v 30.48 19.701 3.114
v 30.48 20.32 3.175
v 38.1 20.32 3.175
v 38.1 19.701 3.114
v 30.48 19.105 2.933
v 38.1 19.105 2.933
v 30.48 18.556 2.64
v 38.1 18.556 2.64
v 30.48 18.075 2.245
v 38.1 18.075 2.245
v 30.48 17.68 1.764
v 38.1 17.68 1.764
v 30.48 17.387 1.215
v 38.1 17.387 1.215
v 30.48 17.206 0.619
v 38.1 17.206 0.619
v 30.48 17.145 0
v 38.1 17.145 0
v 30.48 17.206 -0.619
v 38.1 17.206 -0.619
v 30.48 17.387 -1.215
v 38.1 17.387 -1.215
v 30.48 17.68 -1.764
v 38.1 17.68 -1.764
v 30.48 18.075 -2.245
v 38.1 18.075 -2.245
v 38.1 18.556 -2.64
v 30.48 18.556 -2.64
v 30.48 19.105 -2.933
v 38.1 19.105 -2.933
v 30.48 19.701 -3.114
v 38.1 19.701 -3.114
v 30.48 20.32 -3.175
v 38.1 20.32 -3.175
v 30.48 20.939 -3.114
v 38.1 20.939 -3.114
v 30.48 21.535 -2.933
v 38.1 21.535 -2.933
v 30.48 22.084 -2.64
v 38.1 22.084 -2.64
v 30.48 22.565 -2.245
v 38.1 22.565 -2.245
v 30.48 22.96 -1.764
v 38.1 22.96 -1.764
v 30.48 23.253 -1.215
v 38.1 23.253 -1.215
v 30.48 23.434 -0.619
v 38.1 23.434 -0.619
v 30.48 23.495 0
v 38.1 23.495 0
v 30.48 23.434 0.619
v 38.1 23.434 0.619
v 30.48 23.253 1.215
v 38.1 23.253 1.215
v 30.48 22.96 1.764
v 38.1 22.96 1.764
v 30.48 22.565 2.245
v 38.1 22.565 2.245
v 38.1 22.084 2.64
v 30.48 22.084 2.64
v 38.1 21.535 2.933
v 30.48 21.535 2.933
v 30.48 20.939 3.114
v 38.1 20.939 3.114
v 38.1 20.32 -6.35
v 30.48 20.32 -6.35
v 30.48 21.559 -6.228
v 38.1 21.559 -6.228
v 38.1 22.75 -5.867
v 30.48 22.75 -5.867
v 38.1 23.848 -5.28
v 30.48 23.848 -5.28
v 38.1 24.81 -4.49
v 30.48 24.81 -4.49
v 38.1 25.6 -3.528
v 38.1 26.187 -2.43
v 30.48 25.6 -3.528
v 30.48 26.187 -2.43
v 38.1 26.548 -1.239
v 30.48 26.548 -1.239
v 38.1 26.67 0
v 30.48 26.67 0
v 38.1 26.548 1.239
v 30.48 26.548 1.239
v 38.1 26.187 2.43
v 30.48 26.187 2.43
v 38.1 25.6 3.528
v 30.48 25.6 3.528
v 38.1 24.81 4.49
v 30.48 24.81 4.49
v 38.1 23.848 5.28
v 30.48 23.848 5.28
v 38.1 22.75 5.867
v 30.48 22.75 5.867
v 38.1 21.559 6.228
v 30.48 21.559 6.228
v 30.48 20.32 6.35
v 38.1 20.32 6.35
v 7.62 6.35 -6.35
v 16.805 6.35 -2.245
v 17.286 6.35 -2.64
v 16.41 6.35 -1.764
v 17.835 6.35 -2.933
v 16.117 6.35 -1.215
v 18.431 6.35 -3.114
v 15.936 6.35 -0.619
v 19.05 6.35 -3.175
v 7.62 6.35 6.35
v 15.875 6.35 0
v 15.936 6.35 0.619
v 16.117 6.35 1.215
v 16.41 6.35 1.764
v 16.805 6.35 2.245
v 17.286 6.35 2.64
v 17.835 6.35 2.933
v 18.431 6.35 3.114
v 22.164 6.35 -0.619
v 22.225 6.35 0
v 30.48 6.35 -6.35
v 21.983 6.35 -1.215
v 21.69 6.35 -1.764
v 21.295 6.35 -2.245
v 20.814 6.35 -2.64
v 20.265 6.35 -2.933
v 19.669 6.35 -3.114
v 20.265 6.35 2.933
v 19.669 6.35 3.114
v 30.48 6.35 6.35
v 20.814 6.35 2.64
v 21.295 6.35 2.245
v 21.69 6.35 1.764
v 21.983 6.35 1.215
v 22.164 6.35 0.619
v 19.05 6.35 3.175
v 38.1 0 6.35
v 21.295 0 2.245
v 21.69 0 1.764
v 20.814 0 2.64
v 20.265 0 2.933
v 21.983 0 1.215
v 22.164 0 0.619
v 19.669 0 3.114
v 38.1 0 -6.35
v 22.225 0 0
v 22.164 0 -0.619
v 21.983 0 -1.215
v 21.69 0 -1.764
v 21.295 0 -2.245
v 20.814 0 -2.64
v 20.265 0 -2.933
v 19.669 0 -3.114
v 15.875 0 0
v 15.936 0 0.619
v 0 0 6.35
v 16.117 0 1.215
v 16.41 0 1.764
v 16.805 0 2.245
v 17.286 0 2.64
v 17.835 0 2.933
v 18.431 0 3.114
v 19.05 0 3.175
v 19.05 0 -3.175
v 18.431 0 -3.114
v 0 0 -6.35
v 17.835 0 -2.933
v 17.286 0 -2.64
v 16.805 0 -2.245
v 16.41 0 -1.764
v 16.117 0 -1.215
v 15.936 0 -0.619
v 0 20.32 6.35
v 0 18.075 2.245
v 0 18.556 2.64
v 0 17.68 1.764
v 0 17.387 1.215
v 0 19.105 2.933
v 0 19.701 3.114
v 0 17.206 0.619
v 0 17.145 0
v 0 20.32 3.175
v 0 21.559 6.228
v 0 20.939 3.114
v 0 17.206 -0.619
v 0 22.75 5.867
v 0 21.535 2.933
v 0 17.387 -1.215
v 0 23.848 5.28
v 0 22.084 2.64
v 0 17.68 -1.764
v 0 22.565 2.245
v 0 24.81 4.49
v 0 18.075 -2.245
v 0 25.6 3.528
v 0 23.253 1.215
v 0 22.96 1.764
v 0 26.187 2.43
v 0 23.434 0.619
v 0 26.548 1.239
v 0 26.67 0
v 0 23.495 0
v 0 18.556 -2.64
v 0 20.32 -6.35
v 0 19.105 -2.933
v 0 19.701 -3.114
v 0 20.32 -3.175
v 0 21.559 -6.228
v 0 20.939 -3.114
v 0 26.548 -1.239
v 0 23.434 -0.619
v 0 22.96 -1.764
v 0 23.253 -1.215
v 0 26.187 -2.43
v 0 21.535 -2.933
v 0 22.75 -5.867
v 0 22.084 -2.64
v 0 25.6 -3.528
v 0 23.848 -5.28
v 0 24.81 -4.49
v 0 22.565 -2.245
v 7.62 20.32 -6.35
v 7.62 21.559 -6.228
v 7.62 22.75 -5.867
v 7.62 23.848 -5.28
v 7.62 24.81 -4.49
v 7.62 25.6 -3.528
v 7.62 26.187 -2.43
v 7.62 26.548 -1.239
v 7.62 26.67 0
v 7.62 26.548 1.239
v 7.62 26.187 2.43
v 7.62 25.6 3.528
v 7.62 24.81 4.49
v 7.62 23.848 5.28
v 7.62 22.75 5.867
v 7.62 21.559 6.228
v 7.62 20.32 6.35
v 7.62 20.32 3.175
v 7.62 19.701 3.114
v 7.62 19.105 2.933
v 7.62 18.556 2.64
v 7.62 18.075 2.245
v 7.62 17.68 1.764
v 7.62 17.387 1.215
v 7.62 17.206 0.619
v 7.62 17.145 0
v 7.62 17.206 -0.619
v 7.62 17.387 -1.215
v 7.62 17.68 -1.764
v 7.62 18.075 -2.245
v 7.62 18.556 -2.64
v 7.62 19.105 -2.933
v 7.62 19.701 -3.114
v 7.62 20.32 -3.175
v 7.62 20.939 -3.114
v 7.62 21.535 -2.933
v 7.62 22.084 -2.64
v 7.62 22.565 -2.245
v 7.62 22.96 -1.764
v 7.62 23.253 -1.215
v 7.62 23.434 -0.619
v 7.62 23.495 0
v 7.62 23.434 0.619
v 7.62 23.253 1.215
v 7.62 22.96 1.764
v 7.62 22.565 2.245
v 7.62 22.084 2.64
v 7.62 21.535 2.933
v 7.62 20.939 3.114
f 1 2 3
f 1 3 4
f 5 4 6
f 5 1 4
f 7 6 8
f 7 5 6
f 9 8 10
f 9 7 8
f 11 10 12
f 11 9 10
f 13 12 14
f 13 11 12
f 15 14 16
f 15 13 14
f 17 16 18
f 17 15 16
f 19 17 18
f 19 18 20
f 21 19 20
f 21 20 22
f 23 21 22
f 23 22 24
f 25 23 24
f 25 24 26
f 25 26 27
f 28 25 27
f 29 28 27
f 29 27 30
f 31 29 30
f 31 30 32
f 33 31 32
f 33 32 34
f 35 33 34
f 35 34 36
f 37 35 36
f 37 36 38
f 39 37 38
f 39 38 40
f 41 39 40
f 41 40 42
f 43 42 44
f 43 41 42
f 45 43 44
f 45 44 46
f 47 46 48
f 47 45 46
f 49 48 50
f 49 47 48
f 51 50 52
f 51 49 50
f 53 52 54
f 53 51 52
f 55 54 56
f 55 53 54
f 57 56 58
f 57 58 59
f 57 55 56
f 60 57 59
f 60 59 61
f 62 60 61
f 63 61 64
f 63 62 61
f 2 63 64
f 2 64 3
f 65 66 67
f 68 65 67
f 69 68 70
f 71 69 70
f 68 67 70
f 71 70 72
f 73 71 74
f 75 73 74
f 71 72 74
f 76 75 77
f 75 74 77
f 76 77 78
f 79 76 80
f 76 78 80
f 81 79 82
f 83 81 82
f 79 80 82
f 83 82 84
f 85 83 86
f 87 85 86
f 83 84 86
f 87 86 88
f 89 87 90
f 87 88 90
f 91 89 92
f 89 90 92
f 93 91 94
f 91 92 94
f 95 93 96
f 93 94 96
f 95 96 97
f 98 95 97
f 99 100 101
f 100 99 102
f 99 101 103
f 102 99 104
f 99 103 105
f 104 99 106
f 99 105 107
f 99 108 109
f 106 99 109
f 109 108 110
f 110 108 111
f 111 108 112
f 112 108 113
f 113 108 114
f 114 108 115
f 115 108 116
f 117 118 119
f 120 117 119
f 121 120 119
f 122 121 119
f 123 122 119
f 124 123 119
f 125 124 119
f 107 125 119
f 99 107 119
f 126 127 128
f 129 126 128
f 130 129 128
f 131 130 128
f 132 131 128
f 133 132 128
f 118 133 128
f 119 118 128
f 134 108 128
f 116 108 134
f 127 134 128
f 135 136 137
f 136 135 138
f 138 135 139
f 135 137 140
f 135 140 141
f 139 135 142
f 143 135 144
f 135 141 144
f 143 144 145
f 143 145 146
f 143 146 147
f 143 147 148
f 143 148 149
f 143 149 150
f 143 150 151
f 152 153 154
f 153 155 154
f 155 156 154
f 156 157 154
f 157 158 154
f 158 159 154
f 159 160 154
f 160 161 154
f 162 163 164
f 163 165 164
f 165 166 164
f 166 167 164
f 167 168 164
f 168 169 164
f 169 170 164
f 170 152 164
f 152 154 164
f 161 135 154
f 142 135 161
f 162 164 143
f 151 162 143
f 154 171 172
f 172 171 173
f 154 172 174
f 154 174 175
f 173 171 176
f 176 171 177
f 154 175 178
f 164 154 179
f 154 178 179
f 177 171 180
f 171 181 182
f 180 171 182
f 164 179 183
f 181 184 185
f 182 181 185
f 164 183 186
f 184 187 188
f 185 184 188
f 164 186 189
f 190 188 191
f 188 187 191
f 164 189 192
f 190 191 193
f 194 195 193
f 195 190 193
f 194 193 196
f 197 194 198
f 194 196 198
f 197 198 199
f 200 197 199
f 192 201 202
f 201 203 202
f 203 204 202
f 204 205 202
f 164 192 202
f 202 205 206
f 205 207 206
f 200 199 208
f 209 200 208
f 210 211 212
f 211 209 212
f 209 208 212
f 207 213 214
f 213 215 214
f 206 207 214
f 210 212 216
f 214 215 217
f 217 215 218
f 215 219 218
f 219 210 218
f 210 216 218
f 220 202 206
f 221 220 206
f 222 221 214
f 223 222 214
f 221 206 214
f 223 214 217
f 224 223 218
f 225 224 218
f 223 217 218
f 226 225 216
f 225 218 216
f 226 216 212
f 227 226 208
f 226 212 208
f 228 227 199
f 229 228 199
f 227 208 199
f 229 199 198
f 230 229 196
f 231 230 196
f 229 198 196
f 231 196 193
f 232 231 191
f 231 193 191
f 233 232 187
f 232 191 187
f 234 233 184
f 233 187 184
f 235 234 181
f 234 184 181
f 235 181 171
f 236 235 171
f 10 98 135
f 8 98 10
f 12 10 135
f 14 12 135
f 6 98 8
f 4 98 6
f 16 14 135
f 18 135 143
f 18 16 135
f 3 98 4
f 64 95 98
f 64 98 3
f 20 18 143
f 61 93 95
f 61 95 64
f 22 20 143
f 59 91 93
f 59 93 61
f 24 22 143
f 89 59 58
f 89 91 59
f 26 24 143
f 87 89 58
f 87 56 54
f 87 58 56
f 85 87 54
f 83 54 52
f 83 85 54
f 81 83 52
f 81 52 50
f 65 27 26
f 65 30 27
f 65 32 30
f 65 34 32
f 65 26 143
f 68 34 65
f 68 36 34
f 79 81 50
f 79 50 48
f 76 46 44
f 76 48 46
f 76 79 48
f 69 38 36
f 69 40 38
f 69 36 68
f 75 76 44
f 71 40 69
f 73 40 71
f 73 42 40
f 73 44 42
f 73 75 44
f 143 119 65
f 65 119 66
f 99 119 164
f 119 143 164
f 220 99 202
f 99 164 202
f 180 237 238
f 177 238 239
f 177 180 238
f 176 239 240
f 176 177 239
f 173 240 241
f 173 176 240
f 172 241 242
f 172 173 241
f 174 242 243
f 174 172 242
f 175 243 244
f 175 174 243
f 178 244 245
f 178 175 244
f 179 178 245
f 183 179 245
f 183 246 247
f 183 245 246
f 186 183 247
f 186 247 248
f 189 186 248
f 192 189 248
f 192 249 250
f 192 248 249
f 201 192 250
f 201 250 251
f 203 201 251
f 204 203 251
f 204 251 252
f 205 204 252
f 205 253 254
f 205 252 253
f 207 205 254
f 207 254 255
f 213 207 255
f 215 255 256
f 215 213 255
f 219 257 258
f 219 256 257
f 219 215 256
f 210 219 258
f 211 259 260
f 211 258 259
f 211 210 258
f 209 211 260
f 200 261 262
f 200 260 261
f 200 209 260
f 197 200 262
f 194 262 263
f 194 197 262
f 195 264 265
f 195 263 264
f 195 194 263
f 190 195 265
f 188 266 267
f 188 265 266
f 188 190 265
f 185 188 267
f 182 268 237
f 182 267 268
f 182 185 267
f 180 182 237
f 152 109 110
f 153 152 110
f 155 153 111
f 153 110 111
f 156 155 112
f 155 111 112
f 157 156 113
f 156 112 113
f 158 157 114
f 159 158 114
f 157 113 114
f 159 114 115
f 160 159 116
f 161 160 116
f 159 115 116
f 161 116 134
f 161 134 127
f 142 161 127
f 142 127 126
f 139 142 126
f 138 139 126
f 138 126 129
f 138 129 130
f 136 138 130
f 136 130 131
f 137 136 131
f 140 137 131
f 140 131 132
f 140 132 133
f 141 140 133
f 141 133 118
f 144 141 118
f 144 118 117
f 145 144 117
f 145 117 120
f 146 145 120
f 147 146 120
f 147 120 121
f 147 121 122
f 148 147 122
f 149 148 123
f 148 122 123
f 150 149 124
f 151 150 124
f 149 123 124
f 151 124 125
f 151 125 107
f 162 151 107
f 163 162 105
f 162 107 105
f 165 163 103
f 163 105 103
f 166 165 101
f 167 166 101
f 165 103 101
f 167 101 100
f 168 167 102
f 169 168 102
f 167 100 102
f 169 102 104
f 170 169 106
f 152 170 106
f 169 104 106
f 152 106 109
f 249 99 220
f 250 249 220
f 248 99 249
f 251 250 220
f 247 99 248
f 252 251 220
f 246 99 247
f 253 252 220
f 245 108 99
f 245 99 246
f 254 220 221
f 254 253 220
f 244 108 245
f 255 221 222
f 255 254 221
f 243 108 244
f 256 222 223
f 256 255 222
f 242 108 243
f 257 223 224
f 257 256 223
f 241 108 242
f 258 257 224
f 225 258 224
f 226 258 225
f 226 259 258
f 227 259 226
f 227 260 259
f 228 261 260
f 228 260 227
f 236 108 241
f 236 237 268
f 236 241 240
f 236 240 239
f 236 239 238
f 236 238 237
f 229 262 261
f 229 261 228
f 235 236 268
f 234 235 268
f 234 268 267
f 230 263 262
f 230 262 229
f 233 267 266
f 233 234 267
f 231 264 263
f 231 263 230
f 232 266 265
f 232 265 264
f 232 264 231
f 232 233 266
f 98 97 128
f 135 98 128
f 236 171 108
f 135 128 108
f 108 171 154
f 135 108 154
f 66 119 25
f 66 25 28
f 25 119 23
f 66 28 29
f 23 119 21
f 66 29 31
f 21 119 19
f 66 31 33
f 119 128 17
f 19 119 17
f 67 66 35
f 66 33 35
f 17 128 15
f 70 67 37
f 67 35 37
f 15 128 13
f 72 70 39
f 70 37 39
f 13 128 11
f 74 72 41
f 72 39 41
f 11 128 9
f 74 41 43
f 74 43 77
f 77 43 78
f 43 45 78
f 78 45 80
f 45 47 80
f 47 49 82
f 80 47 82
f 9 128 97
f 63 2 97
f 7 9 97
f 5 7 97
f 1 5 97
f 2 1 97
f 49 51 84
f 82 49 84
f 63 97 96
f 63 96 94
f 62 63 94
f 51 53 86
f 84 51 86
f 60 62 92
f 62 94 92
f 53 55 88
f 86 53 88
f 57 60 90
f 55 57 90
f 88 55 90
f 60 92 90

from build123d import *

# Parameters (mm, degrees)
SKETCH1_R           = 3.175
BOSS_EXTRUDE1_DEPTH = 38.1
SKETCH2_W           = 22.86
SKETCH2_H           = 20.32
CUT_EXTRUDE1_DEPTH  = 25.4
SKETCH3_R           = 3.175
CUT_EXTRUDE2_DEPTH  = 25.4


with BuildPart() as part:
    # Sketch1 → Boss-Extrude1 (new body)
    with BuildSketch(Plane(origin=(0, 0, 0), x_dir=(0, 0, -1), z_dir=(1, 0, 0))):
        with BuildLine():
            Line((-6.35, 0), (6.35, 0))
            Line((6.35, 0), (6.35, 20.32))
            ThreePointArc((6.35, 20.32), (0, 26.67), (-6.35, 20.32))
            Line((-6.35, 20.32), (-6.35, 0))
        make_face()
        with Locations(Location((0, 20.32, 0), (0, 0, 180))):
            Circle(SKETCH1_R, mode=Mode.SUBTRACT)
    extrude(amount=BOSS_EXTRUDE1_DEPTH)

    # Sketch2 → Cut-Extrude1 (cut)
    with BuildSketch(Plane.XY.offset(6.35)):
        with Locations((19.05, 16.51)):
            Rectangle(SKETCH2_W, SKETCH2_H)
    extrude(amount=-CUT_EXTRUDE1_DEPTH, mode=Mode.SUBTRACT)

    # Sketch3 → Cut-Extrude2 (cut)
    with BuildSketch(Plane(origin=(0, 6.35, 0), x_dir=(1, 0, 0), z_dir=(0, 1, 0))):
        with Locations(Location((19.05, 0, 0), (0, 0, 180))):
            Circle(SKETCH3_R)
    extrude(amount=-CUT_EXTRUDE2_DEPTH, mode=Mode.SUBTRACT)


solid = part.part
